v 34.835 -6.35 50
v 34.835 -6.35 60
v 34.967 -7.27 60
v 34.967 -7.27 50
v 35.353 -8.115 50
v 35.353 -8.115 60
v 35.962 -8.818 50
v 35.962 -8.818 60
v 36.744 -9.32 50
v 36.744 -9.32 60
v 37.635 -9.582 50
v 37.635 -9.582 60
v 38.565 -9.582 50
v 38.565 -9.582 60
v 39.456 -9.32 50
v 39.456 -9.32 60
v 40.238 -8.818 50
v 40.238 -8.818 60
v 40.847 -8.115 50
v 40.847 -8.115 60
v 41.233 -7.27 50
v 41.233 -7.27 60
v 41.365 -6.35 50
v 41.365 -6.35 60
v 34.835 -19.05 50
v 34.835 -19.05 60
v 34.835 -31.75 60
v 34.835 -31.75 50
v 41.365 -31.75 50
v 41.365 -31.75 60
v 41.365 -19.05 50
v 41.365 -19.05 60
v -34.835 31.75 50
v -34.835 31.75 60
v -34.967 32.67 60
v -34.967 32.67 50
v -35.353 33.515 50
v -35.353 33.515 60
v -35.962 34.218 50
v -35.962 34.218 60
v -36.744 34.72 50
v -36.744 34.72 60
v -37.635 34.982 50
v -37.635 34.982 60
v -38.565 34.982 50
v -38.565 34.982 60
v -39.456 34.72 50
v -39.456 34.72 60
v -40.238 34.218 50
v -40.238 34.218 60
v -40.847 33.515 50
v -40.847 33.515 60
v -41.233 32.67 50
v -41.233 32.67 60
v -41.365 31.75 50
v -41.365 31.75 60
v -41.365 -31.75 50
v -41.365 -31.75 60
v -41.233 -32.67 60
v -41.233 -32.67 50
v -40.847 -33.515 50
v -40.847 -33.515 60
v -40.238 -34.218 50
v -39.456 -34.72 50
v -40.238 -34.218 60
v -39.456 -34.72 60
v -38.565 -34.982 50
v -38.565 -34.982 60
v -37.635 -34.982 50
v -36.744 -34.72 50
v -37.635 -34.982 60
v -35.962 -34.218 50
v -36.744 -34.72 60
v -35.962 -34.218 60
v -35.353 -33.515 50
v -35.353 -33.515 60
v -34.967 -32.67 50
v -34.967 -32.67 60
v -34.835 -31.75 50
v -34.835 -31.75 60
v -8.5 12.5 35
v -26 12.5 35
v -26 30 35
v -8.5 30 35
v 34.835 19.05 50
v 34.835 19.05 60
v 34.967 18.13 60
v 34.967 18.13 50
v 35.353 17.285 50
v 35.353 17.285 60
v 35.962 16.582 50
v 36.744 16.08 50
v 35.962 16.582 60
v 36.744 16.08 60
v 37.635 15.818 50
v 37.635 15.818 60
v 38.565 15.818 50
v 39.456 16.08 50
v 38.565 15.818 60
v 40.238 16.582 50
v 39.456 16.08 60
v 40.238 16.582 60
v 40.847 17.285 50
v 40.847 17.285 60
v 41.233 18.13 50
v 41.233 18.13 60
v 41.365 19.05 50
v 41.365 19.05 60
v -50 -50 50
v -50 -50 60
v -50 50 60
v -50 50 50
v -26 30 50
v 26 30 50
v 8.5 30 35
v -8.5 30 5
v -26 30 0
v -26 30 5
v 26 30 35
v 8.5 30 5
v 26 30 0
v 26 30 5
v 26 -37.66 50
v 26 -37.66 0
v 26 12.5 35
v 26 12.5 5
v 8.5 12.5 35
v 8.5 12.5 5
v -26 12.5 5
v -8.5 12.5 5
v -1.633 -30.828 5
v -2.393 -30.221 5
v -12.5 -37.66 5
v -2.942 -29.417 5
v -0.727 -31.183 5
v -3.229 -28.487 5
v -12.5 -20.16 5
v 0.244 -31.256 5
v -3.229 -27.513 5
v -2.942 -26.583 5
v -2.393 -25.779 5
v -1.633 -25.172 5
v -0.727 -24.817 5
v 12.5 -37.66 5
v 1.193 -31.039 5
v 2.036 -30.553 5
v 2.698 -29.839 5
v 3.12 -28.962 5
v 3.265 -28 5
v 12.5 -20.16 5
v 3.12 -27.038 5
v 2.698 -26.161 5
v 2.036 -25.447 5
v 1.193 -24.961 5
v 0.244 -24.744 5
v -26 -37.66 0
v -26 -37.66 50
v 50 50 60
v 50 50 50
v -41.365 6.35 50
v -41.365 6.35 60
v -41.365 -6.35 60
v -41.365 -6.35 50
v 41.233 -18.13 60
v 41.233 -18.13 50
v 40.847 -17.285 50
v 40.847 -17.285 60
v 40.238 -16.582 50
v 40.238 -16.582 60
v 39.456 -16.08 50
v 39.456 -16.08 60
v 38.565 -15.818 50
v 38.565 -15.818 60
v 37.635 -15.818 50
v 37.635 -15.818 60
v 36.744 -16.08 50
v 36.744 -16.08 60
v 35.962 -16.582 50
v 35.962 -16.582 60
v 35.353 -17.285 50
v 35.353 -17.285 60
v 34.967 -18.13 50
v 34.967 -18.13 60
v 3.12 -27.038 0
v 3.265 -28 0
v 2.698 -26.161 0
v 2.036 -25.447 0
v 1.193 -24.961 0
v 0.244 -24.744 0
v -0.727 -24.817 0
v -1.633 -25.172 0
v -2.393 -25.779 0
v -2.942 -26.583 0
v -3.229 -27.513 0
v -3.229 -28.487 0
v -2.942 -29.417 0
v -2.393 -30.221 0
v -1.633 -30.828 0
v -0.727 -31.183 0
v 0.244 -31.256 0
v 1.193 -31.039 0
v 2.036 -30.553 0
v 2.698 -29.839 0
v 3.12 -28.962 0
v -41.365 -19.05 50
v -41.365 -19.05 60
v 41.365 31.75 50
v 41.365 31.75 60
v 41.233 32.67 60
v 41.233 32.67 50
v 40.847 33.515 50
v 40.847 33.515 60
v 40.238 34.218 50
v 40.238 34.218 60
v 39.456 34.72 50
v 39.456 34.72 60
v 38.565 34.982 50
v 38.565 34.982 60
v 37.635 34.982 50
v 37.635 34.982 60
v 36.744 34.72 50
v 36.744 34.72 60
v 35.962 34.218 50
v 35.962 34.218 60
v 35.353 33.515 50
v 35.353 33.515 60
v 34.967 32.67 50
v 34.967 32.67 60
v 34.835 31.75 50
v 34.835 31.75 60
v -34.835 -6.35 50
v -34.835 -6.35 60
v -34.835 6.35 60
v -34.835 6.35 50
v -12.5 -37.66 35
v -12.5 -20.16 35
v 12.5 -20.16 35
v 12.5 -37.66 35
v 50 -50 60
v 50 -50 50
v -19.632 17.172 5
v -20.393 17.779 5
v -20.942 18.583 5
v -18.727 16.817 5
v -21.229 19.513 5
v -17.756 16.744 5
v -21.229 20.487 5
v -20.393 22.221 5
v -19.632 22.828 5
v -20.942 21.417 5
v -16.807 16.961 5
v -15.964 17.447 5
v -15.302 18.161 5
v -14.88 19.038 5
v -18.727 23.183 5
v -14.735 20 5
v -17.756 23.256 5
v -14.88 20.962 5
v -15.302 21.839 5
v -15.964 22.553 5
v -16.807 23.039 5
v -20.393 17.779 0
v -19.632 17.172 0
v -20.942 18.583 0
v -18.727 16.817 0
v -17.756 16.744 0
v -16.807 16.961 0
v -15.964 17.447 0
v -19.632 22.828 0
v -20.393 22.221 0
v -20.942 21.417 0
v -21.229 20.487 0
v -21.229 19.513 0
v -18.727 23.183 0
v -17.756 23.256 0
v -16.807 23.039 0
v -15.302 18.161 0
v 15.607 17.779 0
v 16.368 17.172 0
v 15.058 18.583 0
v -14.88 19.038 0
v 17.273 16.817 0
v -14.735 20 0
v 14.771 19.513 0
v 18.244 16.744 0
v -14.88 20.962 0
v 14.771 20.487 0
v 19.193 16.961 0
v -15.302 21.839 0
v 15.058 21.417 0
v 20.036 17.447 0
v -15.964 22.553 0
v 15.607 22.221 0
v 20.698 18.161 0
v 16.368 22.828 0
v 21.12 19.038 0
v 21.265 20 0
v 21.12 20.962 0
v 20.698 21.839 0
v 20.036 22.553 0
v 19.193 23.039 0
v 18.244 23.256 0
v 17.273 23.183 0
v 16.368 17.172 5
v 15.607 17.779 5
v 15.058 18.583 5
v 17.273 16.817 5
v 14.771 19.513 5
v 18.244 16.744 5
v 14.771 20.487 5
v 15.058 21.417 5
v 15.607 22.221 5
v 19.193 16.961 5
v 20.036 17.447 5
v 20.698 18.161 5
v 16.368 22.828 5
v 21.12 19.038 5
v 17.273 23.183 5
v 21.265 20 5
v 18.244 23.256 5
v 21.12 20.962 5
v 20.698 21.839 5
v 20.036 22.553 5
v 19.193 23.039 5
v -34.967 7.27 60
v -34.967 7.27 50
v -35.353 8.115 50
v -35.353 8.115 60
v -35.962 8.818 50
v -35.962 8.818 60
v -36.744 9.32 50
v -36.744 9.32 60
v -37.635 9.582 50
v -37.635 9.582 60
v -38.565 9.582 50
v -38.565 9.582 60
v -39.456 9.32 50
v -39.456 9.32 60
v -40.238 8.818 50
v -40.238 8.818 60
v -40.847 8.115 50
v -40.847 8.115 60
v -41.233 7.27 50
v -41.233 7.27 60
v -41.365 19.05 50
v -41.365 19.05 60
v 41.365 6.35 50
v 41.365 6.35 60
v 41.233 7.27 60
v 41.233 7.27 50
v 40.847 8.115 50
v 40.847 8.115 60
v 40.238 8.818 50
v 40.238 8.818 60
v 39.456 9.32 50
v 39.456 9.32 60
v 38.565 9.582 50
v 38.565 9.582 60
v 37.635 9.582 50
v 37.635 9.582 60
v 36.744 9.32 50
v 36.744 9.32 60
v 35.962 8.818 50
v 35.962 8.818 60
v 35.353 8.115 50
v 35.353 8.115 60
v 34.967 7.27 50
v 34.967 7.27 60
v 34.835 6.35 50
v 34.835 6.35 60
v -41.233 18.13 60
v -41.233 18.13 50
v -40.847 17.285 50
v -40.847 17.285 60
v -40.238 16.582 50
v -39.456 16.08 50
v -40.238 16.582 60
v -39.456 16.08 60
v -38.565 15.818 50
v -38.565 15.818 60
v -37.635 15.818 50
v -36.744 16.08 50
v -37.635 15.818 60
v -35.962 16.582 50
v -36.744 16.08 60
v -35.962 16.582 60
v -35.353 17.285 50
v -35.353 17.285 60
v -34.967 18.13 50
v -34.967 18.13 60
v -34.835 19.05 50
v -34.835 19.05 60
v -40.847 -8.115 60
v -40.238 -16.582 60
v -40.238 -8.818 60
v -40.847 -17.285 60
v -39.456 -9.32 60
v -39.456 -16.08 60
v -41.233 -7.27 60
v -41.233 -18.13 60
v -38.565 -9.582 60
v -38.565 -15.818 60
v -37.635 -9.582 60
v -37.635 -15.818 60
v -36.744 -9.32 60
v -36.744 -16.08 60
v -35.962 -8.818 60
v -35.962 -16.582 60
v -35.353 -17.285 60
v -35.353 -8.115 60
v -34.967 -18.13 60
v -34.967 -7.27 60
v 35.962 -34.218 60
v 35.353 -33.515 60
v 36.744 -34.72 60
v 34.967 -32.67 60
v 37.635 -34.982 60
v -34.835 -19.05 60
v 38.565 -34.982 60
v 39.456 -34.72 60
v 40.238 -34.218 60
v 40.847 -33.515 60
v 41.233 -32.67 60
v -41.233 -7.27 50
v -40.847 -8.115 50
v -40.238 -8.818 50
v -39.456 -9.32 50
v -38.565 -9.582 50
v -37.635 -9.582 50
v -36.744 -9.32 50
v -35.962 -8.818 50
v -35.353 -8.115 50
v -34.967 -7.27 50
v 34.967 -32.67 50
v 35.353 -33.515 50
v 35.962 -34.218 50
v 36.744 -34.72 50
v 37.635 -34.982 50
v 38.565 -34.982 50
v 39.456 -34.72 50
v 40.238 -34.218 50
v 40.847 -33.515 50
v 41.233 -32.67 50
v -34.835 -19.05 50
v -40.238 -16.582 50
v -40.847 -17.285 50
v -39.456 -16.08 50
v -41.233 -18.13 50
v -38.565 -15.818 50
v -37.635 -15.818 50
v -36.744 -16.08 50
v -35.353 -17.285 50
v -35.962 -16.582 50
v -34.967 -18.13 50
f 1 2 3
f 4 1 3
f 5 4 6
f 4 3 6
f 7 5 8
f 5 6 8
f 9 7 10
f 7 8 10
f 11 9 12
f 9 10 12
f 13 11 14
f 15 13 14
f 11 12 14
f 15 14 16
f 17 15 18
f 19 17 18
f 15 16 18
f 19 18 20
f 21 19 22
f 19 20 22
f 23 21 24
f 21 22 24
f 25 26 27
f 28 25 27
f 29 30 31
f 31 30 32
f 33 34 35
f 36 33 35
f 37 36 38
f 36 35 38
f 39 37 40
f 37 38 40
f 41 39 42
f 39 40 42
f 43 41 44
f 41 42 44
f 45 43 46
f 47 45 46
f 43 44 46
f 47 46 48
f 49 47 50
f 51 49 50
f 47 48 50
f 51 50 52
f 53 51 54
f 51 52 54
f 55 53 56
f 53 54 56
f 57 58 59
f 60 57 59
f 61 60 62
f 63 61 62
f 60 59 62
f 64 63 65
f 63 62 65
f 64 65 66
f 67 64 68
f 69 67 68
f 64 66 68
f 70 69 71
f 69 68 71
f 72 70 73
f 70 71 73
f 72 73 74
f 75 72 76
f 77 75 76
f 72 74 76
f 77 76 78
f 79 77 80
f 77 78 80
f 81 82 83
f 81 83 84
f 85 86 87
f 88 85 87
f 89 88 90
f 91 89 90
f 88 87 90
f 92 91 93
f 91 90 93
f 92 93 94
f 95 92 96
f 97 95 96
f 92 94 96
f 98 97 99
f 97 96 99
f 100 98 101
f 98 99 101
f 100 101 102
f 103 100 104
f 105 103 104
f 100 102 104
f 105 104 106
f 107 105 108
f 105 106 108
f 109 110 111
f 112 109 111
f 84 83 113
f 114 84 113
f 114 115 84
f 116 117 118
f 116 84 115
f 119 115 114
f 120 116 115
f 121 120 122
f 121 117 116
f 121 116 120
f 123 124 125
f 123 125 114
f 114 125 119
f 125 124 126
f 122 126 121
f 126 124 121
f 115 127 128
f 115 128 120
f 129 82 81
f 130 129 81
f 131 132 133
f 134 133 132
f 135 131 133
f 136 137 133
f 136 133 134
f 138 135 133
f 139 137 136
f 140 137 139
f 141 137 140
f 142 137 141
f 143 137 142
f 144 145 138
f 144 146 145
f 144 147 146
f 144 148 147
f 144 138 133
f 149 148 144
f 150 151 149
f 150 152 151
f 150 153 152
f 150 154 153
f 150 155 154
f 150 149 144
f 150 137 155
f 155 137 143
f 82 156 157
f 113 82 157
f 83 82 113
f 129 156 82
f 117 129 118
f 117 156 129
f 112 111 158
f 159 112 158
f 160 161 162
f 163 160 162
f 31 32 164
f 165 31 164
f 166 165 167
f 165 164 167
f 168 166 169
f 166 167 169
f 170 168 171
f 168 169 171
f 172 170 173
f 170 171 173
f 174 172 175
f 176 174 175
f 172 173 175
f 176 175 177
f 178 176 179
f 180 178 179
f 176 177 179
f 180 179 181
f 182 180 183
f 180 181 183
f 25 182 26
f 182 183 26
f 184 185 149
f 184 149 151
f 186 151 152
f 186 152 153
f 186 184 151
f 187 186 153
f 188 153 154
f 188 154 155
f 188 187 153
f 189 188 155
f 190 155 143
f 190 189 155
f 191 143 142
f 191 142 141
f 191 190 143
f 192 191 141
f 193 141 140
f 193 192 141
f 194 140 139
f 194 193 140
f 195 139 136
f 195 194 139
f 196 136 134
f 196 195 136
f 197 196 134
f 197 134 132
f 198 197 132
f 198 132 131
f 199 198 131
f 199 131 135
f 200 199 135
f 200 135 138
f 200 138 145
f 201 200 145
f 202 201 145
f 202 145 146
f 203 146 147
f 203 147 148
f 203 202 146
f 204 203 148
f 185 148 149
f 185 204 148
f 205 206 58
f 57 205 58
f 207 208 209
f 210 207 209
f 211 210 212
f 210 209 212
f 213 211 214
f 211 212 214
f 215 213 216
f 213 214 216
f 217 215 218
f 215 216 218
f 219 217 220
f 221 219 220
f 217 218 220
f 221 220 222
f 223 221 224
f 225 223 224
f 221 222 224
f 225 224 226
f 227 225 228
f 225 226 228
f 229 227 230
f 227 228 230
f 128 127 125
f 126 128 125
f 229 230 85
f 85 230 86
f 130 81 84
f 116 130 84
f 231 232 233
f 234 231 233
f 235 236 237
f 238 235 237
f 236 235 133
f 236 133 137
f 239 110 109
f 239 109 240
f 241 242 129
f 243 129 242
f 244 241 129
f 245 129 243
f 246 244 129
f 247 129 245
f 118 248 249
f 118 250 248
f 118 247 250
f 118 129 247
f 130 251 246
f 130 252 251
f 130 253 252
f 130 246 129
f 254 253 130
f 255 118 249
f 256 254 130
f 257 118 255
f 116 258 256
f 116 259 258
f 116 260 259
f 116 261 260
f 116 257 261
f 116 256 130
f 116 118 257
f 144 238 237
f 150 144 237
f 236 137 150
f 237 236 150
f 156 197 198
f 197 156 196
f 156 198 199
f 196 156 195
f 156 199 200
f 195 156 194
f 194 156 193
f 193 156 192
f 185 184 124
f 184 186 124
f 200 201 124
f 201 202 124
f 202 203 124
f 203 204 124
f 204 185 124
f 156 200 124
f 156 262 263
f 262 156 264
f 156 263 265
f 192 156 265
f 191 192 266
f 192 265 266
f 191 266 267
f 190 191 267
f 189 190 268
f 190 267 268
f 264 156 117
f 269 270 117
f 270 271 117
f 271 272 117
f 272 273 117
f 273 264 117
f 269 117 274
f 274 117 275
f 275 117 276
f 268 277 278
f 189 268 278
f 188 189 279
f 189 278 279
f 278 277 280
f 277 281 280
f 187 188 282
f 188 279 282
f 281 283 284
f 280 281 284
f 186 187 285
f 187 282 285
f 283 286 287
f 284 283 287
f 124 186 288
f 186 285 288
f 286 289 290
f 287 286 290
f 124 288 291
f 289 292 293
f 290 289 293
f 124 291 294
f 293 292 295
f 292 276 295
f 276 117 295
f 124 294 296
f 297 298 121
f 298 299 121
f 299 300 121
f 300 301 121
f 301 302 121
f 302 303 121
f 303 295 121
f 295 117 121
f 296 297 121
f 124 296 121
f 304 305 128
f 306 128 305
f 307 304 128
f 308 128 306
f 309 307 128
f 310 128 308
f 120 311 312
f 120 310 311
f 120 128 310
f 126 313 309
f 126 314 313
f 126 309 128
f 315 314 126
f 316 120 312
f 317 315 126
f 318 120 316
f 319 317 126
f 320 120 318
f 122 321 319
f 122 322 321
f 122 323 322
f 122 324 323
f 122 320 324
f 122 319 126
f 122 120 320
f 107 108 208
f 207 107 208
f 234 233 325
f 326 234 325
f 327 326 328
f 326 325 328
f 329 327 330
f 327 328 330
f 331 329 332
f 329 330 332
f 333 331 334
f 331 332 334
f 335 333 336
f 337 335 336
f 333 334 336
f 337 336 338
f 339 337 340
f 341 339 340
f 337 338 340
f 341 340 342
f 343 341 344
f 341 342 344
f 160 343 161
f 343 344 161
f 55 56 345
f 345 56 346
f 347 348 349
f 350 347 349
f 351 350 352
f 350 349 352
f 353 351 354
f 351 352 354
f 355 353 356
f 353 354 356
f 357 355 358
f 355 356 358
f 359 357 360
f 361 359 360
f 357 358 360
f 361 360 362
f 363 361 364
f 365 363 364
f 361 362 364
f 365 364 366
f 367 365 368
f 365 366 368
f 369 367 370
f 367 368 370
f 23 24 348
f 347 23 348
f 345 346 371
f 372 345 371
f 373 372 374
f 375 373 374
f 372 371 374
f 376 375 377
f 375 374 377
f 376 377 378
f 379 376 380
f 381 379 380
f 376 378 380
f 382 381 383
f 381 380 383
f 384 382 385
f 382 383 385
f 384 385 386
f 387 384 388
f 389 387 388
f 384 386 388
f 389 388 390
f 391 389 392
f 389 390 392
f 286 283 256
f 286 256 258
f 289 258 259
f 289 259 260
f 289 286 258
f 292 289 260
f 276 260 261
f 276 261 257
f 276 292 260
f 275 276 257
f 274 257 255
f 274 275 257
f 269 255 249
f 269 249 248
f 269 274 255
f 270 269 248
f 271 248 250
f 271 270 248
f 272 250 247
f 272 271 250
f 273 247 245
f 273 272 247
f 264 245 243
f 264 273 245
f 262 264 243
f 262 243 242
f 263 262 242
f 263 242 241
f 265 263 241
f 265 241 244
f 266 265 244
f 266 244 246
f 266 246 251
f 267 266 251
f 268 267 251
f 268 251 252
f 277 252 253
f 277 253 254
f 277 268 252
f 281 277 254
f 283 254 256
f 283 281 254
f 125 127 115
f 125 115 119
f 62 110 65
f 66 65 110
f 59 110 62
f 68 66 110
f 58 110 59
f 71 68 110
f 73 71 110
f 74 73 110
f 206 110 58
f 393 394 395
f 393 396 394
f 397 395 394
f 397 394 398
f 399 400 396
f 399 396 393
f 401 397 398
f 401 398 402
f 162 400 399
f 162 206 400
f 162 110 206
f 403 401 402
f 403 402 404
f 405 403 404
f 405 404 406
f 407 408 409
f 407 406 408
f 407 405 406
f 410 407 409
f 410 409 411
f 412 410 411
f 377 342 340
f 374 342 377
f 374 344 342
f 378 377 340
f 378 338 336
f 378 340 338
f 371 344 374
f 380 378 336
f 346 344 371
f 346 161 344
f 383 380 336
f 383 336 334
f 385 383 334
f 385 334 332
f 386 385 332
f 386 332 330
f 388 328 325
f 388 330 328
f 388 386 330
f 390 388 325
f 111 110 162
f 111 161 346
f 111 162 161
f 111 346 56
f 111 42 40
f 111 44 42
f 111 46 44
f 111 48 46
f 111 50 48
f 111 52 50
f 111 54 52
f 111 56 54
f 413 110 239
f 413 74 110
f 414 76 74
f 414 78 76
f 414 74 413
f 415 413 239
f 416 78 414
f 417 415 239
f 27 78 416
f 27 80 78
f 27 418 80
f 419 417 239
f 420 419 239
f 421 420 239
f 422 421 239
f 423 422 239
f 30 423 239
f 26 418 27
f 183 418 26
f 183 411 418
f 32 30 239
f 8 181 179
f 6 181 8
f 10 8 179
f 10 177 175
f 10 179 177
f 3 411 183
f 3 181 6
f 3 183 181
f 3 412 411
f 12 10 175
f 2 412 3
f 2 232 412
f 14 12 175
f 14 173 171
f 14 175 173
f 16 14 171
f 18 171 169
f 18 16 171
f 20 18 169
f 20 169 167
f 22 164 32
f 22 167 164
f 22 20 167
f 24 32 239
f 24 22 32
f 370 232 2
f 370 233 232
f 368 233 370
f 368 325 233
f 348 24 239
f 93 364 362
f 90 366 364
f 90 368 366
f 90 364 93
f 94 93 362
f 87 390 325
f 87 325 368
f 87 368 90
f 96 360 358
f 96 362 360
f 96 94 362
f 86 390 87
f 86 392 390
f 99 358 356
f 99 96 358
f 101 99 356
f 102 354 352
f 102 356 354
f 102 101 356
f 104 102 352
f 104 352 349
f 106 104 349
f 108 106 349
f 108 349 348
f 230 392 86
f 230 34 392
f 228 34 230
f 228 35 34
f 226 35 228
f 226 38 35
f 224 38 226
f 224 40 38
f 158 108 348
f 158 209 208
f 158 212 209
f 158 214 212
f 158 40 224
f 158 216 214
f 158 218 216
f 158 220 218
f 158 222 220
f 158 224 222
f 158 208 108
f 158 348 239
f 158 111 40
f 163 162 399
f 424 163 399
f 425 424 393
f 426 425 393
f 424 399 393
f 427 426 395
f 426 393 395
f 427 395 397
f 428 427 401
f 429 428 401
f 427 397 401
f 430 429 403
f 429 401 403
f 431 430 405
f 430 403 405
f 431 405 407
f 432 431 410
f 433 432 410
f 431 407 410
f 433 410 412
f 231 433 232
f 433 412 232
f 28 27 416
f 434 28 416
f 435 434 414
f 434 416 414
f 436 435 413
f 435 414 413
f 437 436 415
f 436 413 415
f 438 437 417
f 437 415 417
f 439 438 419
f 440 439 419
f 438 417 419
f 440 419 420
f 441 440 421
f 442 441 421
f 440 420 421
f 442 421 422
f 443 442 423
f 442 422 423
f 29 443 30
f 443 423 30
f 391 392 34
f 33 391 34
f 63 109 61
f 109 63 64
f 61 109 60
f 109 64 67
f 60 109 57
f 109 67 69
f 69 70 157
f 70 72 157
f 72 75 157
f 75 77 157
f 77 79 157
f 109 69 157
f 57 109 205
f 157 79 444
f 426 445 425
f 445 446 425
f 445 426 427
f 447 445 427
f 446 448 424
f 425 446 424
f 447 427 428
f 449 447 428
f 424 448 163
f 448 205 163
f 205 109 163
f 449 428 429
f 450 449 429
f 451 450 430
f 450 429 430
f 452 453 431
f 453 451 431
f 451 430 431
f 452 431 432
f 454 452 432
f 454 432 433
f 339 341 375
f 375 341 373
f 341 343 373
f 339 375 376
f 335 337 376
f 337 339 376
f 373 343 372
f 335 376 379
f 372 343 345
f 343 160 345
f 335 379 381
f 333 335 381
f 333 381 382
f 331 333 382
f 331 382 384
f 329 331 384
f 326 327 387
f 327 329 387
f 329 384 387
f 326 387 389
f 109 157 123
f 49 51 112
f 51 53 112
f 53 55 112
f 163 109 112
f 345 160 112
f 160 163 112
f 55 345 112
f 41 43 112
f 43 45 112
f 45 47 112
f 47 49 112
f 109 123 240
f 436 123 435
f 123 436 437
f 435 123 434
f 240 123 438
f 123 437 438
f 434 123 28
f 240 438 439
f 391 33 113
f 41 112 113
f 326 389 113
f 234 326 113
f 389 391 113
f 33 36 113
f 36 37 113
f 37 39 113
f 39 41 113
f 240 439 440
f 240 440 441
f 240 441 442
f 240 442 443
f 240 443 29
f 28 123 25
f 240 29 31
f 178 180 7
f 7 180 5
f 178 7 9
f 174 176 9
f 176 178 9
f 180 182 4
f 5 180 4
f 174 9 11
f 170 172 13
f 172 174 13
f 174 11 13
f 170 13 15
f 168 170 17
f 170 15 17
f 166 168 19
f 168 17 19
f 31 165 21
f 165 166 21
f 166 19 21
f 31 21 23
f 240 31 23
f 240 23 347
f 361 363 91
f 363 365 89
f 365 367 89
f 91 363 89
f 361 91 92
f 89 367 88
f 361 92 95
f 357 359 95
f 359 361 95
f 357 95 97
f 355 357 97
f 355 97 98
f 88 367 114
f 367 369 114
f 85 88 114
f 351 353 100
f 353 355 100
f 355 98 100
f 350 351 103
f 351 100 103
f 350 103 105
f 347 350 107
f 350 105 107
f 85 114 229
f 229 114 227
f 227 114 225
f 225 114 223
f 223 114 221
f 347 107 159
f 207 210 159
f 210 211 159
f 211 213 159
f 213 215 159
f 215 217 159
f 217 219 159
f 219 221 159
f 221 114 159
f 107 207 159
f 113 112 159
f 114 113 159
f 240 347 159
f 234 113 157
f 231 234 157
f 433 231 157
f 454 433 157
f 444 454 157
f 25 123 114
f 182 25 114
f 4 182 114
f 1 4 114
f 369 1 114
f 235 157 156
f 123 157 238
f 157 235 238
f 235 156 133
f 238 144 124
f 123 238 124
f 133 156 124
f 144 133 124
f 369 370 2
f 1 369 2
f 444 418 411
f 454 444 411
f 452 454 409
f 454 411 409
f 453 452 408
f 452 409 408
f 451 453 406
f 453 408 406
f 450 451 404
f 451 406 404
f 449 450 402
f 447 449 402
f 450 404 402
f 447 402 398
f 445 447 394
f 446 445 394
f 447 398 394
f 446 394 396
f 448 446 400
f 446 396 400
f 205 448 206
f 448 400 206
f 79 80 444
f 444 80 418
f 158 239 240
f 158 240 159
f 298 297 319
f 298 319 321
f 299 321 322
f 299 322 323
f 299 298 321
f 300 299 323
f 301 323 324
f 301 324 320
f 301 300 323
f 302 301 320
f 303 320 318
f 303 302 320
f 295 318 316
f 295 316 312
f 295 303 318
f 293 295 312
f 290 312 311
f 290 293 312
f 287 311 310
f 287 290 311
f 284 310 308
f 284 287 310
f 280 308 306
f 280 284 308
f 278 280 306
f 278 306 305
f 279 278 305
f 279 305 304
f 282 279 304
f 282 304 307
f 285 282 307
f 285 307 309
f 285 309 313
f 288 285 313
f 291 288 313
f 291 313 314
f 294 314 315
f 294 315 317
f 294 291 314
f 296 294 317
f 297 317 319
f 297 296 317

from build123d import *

# Parameters (mm, degrees)
F0_W      = 52
F0_H      = 67.66
F2_DEPTH  = 5
F1_R      = 3.265
F3_DEPTH  = 5
F4_W      = 52
F4_H      = 67.66
F5_DEPTH  = 30
F6_W      = 17.5
F6_H      = 17.5
F6_W_2    = 25
F7_DEPTH  = 30
F8_W      = 52
F8_H      = 67.66
F9_DEPTH  = 25
F10_W     = 100
F10_H     = 100
F11_DEPTH = 10
F13_DEPTH = 10


with BuildPart() as f2:
    # F0 (on Top) → F2 (new body)
    with BuildSketch(Plane.XY):
        with Locations((0, -3.83)):
            Rectangle(F0_W, F0_H)
    extrude(amount=F2_DEPTH)

    # F1 (on face) → F3 (cut)
    with BuildSketch(Plane.XY):
        with Locations((-18, 20)):
            Circle(F1_R)
        with Locations((18, 20)):
            Circle(F1_R)
        with Locations((0, -28)):
            Circle(F1_R)
    extrude(amount=F3_DEPTH, mode=Mode.SUBTRACT)

    # F4 (on face) → F5 (join)
    with BuildSketch(Plane.XY.offset(5)):
        with Locations((0, -3.83)):
            Rectangle(F4_W, F4_H)
    extrude(amount=F5_DEPTH)

    # F6 (on face) → F7 (cut)
    with BuildSketch(Plane.XY.offset(35)):
        with Locations((-17.25, 21.25)):
            Rectangle(F6_W, F6_H)
        with Locations((17.25, 21.25)):
            Rectangle(F6_W, F6_H)
        with Locations((0, -28.91)):
            Rectangle(F6_W_2, F6_H)
    extrude(amount=-F7_DEPTH, mode=Mode.SUBTRACT)

    # F8 (on face) → F9 (join)
    with BuildSketch(Plane.XY.offset(35)):
        with Locations((0, -3.83)):
            Rectangle(F8_W, F8_H)
    extrude(amount=F9_DEPTH)

    # F10 (on face) → F11 (join)
    with BuildSketch(Plane.XY.offset(60)):
        Rectangle(F10_W, F10_H)
    extrude(amount=-F11_DEPTH)

    # F12 (on face) → F13 (cut)
    with BuildSketch(Plane.XY.offset(60)):
        with BuildLine():
            Line((34.835, -6.35), (41.365, -6.35))
            ThreePointArc((41.365, -6.35), (38.1, -3.085), (34.835, -6.35))
        make_face()
        with BuildLine():
            ThreePointArc((34.835, -6.35), (38.1, -9.615), (41.365, -6.35))
            Line((41.365, -6.35), (34.835, -6.35))
        make_face()
        with BuildLine():
            ThreePointArc((34.835, -6.35), (38.1, -3.085), (41.365, -6.35))
            Line((41.365, -6.35), (41.365, 6.35))
            ThreePointArc((41.365, 6.35), (38.1, 3.085), (34.835, 6.35))
            Line((34.835, 6.35), (34.835, -6.35))
        make_face()
        with BuildLine():
            Line((34.835, 6.35), (41.365, 6.35))
            ThreePointArc((41.365, 6.35), (38.1, 9.615), (34.835, 6.35))
        make_face()
        with BuildLine():
            ThreePointArc((34.835, 6.35), (38.1, 3.085), (41.365, 6.35))
            Line((41.365, 6.35), (34.835, 6.35))
        make_face()
        with BuildLine():
            Line((34.835, -31.75), (41.365, -31.75))
            ThreePointArc((41.365, -31.75), (38.1, -28.485), (34.835, -31.75))
        make_face()
        with BuildLine():
            ThreePointArc((34.835, -31.75), (38.1, -35.015), (41.365, -31.75))
            Line((41.365, -31.75), (34.835, -31.75))
        make_face()
        with BuildLine():
            ThreePointArc((34.835, -31.75), (38.1, -28.485), (41.365, -31.75))
            Line((41.365, -31.75), (41.365, -19.05))
            ThreePointArc((41.365, -19.05), (38.1, -22.315), (34.835, -19.05))
            Line((34.835, -19.05), (34.835, -31.75))
        make_face()
        with BuildLine():
            Line((34.835, -19.05), (41.365, -19.05))
            ThreePointArc((41.365, -19.05), (38.1, -15.785), (34.835, -19.05))
        make_face()
        with BuildLine():
            ThreePointArc((34.835, -19.05), (38.1, -22.315), (41.365, -19.05))
            Line((41.365, -19.05), (34.835, -19.05))
        make_face()
        with BuildLine():
            ThreePointArc((34.835, 31.75), (38.1, 28.485), (41.365, 31.75))
            ThreePointArc((41.365, 31.75), (38.1, 35.015), (34.835, 31.75))
        make_face()
        with BuildLine():
            Line((41.365, 19.05), (41.365, 31.75))
            ThreePointArc((41.365, 31.75), (38.1, 28.485), (34.835, 31.75))
            Line((34.835, 31.75), (34.835, 19.05))
            ThreePointArc((34.835, 19.05), (38.1, 22.315), (41.365, 19.05))
        make_face()
        with BuildLine():
            ThreePointArc((34.835, 19.05), (38.1, 15.785), (41.365, 19.05))
            ThreePointArc((41.365, 19.05), (38.1, 22.315), (34.835, 19.05))
        make_face()
        with BuildLine():
            ThreePointArc((-41.365, -31.75), (-38.1, -35.015), (-34.835, -31.75))
            ThreePointArc((-34.835, -31.75), (-38.1, -28.485), (-41.365, -31.75))
        make_face()
        with BuildLine():
            ThreePointArc((-41.365, -31.75), (-38.1, -28.485), (-34.835, -31.75))
            Line((-34.835, -31.75), (-34.835, -19.05))
            ThreePointArc((-34.835, -19.05), (-38.1, -22.315), (-41.365, -19.05))
            Line((-41.365, -19.05), (-41.365, -31.75))
        make_face()
        with BuildLine():
            ThreePointArc((-41.365, -19.05), (-38.1, -22.315), (-34.835, -19.05))
            ThreePointArc((-34.835, -19.05), (-38.1, -15.785), (-41.365, -19.05))
        make_face()
        with BuildLine():
            ThreePointArc((-41.365, -6.35), (-38.1, -9.615), (-34.835, -6.35))
            ThreePointArc((-34.835, -6.35), (-38.1, -3.085), (-41.365, -6.35))
        make_face()
        with BuildLine():
            ThreePointArc((-41.365, -6.35), (-38.1, -3.085), (-34.835, -6.35))
            Line((-34.835, -6.35), (-34.835, 6.35))
            ThreePointArc((-34.835, 6.35), (-38.1, 3.085), (-41.365, 6.35))
            Line((-41.365, 6.35), (-41.365, -6.35))
        make_face()
        with BuildLine():
            ThreePointArc((-41.365, 6.35), (-38.1, 3.085), (-34.835, 6.35))
            ThreePointArc((-34.835, 6.35), (-38.1, 9.615), (-41.365, 6.35))
        make_face()
        with BuildLine():
            ThreePointArc((-41.365, 19.05), (-38.1, 15.785), (-34.835, 19.05))
            ThreePointArc((-34.835, 19.05), (-38.1, 22.315), (-41.365, 19.05))
        make_face()
        with BuildLine():
            ThreePointArc((-41.365, 19.05), (-38.1, 22.315), (-34.835, 19.05))
            Line((-34.835, 19.05), (-34.835, 31.75))
            ThreePointArc((-34.835, 31.75), (-38.1, 28.485), (-41.365, 31.75))
            Line((-41.365, 31.75), (-41.365, 19.05))
        make_face()
        with BuildLine():
            ThreePointArc((-41.365, 31.75), (-38.1, 28.485), (-34.835, 31.75))
            ThreePointArc((-34.835, 31.75), (-38.1, 35.015), (-41.365, 31.75))
        make_face()
    extrude(amount=-F13_DEPTH, mode=Mode.SUBTRACT)


solid = f2.part
